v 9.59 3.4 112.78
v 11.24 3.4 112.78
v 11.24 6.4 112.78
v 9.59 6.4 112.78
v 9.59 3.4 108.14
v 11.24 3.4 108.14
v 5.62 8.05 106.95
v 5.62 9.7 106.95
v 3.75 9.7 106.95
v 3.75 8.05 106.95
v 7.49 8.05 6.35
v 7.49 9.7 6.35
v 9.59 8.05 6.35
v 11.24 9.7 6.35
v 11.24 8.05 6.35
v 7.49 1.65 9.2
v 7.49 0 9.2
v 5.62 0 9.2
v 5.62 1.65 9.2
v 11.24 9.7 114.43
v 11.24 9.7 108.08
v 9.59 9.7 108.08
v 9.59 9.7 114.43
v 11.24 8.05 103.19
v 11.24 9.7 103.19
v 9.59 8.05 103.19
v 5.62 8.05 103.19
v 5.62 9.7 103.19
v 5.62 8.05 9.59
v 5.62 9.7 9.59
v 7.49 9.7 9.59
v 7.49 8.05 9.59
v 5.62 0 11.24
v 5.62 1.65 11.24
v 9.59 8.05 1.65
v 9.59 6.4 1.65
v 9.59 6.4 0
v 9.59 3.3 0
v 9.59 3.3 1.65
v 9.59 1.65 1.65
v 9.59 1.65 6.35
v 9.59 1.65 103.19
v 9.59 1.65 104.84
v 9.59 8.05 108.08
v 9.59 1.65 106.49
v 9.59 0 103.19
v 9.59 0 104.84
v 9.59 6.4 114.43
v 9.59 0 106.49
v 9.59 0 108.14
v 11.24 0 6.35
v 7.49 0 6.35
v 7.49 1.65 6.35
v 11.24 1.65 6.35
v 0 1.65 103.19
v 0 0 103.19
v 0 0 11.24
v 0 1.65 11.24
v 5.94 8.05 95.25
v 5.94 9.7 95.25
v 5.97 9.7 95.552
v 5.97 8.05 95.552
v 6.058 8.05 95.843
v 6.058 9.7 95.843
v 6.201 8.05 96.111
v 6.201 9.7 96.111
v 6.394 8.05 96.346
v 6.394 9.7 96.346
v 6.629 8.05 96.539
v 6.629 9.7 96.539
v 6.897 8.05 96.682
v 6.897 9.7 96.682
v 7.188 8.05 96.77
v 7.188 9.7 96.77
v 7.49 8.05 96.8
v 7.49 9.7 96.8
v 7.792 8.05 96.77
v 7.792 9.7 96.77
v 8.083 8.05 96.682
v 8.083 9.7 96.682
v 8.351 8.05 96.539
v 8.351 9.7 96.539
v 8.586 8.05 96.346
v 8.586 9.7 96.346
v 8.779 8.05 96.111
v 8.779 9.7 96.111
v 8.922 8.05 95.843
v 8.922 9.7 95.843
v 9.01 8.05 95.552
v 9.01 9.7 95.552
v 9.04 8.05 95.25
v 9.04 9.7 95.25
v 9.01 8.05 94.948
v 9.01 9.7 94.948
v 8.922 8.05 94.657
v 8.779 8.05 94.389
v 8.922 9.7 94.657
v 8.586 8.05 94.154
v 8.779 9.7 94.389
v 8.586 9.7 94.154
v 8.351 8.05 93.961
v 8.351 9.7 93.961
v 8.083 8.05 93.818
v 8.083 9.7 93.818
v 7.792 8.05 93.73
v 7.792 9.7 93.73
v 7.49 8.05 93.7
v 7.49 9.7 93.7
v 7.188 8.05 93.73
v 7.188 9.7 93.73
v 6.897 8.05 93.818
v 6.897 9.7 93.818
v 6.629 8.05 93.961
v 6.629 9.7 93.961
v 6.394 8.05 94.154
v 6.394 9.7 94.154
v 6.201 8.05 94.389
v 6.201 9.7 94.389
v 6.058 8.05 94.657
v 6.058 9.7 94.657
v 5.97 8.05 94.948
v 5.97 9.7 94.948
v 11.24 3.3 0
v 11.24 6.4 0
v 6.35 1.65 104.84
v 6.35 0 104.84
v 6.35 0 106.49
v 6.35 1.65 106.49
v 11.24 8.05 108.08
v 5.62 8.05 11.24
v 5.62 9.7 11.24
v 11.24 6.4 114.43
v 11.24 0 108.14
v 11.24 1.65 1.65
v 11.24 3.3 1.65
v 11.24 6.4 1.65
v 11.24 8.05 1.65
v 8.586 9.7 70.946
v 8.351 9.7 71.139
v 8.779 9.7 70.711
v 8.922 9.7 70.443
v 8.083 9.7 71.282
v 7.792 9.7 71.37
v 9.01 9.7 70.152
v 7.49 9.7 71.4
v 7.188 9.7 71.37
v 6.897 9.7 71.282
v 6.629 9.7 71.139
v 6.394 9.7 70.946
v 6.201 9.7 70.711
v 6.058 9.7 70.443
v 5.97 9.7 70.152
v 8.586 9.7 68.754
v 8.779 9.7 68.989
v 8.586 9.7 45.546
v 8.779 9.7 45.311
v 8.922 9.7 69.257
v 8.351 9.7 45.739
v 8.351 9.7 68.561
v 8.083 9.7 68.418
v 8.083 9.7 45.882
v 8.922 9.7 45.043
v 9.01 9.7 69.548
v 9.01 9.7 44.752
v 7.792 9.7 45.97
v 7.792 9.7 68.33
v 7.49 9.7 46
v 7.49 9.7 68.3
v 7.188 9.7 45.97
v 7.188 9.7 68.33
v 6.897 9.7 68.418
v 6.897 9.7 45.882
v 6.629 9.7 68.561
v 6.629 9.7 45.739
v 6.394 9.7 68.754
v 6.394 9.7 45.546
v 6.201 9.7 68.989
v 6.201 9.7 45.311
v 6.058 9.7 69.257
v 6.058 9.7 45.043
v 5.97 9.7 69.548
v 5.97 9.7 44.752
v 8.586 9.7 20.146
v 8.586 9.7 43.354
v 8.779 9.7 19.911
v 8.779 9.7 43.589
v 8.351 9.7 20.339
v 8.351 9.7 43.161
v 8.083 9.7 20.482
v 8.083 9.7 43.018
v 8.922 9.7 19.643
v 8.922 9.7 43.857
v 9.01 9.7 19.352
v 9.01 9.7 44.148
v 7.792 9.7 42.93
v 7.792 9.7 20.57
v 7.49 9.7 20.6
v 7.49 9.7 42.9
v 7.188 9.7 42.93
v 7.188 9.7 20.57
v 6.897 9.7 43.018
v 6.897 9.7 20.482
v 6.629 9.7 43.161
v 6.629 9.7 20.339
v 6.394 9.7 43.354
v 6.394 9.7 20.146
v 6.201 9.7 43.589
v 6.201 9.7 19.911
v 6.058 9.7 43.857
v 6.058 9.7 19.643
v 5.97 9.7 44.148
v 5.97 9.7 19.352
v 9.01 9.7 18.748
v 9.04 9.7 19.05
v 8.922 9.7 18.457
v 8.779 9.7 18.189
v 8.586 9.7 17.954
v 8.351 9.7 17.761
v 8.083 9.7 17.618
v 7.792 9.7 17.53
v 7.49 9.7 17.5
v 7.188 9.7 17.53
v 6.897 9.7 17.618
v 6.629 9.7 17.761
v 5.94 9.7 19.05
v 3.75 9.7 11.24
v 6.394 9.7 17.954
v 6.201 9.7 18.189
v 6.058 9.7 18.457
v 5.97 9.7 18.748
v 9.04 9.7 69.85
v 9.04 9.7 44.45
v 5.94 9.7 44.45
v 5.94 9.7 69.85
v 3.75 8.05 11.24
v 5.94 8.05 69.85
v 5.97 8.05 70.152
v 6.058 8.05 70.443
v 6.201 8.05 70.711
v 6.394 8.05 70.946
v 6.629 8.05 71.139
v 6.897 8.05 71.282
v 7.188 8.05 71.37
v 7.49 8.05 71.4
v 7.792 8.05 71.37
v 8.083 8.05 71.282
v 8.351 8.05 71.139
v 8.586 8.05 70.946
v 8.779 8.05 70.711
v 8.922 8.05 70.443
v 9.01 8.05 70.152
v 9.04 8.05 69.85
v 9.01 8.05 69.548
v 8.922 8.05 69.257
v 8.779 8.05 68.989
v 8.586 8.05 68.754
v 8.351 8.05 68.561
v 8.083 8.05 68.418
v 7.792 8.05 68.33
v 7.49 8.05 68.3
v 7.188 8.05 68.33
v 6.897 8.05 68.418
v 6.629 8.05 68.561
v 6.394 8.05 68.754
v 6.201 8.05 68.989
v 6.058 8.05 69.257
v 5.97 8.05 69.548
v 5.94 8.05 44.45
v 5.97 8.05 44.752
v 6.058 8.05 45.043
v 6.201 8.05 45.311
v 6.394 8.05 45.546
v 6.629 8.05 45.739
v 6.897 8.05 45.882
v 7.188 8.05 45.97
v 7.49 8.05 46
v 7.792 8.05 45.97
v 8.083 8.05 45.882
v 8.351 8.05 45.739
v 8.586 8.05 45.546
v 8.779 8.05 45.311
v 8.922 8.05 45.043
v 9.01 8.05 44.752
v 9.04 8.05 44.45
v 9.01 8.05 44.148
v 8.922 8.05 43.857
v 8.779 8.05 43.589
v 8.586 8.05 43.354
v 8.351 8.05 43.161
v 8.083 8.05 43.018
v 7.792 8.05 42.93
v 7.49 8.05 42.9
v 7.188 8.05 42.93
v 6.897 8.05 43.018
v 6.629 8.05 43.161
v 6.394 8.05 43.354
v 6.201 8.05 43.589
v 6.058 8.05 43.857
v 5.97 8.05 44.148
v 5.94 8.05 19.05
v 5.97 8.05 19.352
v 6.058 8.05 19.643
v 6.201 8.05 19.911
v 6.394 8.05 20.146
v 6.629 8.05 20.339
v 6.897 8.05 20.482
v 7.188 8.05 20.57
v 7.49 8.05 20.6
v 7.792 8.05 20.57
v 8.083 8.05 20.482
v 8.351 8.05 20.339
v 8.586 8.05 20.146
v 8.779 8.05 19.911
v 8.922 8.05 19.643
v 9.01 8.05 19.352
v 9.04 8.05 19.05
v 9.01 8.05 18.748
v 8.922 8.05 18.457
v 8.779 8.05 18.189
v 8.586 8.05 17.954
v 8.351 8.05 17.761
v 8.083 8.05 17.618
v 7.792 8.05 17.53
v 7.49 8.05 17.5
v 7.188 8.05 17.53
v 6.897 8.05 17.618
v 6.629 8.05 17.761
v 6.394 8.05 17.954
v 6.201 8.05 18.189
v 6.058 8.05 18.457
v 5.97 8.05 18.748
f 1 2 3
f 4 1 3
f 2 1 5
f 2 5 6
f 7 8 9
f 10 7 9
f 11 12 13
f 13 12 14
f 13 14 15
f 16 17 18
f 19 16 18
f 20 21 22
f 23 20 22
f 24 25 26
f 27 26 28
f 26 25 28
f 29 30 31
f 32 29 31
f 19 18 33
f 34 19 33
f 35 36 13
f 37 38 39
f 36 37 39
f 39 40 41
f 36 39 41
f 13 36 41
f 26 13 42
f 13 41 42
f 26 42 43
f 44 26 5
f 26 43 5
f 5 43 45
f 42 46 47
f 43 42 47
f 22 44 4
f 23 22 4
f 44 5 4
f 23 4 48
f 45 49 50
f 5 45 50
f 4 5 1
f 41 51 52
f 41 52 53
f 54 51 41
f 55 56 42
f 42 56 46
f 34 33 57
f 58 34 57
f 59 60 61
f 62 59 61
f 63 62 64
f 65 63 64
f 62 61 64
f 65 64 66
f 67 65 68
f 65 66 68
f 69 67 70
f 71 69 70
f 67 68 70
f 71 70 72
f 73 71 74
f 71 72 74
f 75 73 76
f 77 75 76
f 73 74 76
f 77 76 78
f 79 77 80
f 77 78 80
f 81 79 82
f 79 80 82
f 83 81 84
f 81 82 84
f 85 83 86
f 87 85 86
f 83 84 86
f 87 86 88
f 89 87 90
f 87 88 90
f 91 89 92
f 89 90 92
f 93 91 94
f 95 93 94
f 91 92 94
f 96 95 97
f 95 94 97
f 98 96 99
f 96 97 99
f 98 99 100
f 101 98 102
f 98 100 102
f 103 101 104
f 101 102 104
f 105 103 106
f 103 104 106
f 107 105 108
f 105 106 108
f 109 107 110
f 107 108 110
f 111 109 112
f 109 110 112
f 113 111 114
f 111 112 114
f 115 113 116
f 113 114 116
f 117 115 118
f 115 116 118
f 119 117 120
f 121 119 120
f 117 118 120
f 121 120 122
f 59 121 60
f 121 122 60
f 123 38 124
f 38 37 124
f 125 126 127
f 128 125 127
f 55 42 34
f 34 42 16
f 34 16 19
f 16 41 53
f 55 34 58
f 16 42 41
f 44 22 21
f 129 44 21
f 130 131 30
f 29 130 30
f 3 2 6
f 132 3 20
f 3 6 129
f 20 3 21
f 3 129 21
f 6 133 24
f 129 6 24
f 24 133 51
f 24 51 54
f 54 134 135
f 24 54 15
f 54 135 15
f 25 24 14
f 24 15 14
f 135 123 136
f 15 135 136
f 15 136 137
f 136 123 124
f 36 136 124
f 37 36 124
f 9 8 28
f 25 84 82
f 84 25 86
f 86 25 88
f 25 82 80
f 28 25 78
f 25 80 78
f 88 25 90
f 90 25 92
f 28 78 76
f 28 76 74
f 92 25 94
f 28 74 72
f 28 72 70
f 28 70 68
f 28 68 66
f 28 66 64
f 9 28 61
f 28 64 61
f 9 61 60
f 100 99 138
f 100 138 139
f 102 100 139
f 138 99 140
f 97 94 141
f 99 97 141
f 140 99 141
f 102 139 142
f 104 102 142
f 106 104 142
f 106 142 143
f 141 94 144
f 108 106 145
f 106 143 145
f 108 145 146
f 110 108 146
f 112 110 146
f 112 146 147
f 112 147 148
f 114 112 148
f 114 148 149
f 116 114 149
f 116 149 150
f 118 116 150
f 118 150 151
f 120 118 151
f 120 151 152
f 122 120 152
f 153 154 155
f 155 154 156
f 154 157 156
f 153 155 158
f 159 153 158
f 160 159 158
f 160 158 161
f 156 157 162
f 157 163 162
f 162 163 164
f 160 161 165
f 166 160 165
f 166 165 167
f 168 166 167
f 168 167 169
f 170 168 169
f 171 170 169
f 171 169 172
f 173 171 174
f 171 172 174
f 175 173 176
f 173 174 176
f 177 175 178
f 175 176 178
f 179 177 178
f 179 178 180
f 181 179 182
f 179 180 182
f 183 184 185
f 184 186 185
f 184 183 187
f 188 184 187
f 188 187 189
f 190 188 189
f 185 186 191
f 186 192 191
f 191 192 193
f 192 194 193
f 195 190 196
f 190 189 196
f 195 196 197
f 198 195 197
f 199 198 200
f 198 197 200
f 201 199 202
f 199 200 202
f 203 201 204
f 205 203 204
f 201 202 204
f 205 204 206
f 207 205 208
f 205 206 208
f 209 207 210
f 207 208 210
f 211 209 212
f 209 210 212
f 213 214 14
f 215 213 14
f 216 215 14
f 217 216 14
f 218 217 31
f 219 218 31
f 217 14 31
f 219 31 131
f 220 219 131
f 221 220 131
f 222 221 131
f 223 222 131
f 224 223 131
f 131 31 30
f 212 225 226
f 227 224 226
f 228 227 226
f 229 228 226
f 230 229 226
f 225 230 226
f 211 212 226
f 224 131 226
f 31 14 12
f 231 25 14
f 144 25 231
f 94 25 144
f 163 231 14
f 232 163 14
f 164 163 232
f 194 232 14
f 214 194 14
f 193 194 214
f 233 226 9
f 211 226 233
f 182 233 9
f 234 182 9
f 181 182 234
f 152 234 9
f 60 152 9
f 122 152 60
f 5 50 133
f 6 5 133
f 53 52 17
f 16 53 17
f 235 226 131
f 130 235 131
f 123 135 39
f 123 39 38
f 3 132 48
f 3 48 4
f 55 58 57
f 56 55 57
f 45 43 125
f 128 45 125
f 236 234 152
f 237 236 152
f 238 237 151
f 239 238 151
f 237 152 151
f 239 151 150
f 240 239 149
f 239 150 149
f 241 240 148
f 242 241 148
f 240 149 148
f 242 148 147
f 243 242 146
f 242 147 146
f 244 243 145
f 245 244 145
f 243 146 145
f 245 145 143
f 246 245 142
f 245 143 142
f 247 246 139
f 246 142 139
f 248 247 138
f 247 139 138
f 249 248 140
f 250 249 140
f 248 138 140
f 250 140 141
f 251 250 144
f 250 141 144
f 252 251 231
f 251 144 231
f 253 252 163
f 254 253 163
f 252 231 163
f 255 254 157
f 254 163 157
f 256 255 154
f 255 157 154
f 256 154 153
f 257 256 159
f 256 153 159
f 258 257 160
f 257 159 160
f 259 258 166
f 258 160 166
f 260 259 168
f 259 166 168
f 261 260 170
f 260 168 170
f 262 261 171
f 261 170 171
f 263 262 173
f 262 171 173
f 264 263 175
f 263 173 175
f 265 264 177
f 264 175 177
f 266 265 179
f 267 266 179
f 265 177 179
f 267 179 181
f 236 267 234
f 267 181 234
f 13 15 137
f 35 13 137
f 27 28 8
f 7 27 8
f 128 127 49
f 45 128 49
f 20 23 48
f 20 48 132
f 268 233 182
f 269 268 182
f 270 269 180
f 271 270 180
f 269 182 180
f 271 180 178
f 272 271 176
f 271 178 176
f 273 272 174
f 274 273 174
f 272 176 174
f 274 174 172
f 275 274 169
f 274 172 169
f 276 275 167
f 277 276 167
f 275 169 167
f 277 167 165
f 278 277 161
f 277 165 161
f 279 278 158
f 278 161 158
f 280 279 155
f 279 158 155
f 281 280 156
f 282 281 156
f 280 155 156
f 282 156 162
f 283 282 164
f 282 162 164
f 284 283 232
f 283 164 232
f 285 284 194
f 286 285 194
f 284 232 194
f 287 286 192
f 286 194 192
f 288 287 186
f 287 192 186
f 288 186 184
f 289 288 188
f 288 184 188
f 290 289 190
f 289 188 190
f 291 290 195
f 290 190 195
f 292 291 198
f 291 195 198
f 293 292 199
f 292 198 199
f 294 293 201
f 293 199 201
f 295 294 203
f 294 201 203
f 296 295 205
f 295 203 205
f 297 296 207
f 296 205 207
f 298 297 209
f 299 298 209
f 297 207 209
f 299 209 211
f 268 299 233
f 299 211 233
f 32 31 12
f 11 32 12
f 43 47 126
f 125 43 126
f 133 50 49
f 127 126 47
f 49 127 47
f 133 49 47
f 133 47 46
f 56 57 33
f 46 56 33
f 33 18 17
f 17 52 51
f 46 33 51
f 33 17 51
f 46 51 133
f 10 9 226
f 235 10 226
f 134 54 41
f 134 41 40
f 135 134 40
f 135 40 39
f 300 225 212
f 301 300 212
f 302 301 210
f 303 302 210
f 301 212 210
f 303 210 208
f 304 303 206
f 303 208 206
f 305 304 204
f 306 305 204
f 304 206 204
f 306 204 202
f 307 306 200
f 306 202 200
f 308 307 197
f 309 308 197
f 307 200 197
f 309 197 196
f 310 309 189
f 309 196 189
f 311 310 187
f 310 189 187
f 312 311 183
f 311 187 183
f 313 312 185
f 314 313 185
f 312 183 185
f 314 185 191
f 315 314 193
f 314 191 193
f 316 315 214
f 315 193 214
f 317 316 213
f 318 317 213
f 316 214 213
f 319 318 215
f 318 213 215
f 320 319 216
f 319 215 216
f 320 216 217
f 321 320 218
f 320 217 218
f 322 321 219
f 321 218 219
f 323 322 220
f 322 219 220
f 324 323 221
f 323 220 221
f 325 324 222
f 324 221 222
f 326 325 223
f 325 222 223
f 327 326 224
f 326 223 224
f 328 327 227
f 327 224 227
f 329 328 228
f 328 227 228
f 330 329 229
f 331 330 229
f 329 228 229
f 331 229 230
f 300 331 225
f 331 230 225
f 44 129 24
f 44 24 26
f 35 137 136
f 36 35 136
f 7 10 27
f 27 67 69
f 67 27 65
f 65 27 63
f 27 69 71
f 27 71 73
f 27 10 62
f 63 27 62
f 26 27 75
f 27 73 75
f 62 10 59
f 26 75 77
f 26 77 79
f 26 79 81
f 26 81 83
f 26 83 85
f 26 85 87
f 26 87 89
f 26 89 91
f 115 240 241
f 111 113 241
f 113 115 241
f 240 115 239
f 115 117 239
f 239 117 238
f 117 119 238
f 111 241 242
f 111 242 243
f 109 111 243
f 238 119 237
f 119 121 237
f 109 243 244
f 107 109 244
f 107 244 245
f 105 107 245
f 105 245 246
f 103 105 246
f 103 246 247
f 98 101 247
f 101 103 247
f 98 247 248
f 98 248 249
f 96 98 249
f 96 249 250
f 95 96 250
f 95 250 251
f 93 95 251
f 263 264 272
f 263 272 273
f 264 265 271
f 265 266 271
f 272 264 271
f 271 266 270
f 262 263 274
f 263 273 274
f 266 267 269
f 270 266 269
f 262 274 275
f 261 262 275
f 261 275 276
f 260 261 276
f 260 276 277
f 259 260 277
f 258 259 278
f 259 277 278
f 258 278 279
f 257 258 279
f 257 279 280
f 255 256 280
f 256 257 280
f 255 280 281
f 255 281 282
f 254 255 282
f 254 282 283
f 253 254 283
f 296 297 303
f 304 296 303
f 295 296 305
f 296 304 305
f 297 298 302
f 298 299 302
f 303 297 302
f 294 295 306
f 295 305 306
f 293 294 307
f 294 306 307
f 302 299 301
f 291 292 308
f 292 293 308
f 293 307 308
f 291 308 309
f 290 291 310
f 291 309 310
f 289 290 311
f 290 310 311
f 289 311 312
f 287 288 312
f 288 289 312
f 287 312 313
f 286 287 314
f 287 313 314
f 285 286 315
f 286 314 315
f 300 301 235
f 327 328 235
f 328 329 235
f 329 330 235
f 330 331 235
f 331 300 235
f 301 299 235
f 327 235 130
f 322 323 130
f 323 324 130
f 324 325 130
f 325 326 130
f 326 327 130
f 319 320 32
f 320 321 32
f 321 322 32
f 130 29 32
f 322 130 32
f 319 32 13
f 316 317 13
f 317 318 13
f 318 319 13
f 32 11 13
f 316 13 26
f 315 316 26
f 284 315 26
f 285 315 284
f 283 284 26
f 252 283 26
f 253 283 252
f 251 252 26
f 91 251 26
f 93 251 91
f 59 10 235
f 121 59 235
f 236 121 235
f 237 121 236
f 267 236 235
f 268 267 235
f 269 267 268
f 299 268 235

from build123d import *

# Parameters (mm, degrees)
EXTRUDE4_DEPTH     = 114.43
CUT_EXTRUDE1_DEPTH = 116.389135104
SKETCH3_R          = 1.55
CUT_EXTRUDE2_DEPTH = 1.65
CUT_EXTRUDE3_DEPTH = 3.4
SKETCH5_W          = 1.65
SKETCH5_H          = 3
CUT_EXTRUDE4_DEPTH = 1.65


with BuildPart() as part:
    # Sketch1 → Extrude4 (new body)
    with BuildSketch(Plane.XY):
        Polygon((0, 0), (11.24, 0), (11.24, 9.7), (0, 9.7), (0, 8.05), (9.59, 8.05), (9.59, 1.65), (0, 1.65), align=None)
    extrude(amount=EXTRUDE4_DEPTH)

    # Sketch2 → Cut-Extrude1 (cut, through all)
    with BuildSketch(Plane(origin=(11.24, 0, 0), x_dir=(0, 0, -1), z_dir=(1, 0, 0))):
        Polygon((-6.35, 1.65), (-1.65, 1.65), (-1.65, 3.3), (0, 3.3), (0, 0), (-6.35, 0), align=None)
        Polygon((0, 9.7), (-6.35, 9.7), (-6.35, 8.05), (-1.65, 8.05), (-1.65, 6.4), (0, 6.4), align=None)
    extrude(amount=-CUT_EXTRUDE1_DEPTH, mode=Mode.SUBTRACT)

    # Sketch3 → Cut-Extrude2 (cut)
    with BuildSketch(Plane(origin=(0, 9.7, 0), x_dir=(-1, 0, 0), z_dir=(0, 1, 0))):
        with Locations((-7.49, 19.05)):
            Circle(SKETCH3_R)
        with Locations((-7.49, 44.45)):
            Circle(SKETCH3_R)
        with Locations((-7.49, 69.85)):
            Circle(SKETCH3_R)
        with Locations((-7.49, 95.25)):
            Circle(SKETCH3_R)
        Polygon((0, 6.35), (0, 114.43), (-9.59, 114.43), (-9.59, 108.08), (-11.24, 108.08), (-11.24, 103.19), (-5.62, 103.19), (-5.62, 106.95), (-3.75, 106.95), (-3.75, 11.24), (-5.62, 11.24), (-5.62, 9.59), (-7.49, 9.59), (-7.49, 6.35), align=None)
    extrude(amount=-CUT_EXTRUDE2_DEPTH, mode=Mode.SUBTRACT)

    # Sketch4 → Cut-Extrude3 (cut)
    with BuildSketch(Plane.XZ):
        Polygon((7.49, 6.35), (7.49, 9.2), (5.62, 9.2), (5.62, 11.24), (0, 11.24), (0, 6.35), align=None)
        Polygon((0, 103.19), (9.59, 103.19), (9.59, 104.84), (6.35, 104.84), (6.35, 106.49), (9.59, 106.49), (9.59, 108.14), (11.24, 108.14), (11.24, 114.43), (0, 114.43), align=None)
    extrude(amount=-CUT_EXTRUDE3_DEPTH, mode=Mode.SUBTRACT)

    # Sketch5 → Cut-Extrude4 (cut)
    with BuildSketch(Plane(origin=(11.24, 0, 0), x_dir=(0, 0, -1), z_dir=(1, 0, 0))):
        with Locations((-113.605, 4.9)):
            Rectangle(SKETCH5_W, SKETCH5_H)
    extrude(amount=-CUT_EXTRUDE4_DEPTH, mode=Mode.SUBTRACT)


solid = part.part
